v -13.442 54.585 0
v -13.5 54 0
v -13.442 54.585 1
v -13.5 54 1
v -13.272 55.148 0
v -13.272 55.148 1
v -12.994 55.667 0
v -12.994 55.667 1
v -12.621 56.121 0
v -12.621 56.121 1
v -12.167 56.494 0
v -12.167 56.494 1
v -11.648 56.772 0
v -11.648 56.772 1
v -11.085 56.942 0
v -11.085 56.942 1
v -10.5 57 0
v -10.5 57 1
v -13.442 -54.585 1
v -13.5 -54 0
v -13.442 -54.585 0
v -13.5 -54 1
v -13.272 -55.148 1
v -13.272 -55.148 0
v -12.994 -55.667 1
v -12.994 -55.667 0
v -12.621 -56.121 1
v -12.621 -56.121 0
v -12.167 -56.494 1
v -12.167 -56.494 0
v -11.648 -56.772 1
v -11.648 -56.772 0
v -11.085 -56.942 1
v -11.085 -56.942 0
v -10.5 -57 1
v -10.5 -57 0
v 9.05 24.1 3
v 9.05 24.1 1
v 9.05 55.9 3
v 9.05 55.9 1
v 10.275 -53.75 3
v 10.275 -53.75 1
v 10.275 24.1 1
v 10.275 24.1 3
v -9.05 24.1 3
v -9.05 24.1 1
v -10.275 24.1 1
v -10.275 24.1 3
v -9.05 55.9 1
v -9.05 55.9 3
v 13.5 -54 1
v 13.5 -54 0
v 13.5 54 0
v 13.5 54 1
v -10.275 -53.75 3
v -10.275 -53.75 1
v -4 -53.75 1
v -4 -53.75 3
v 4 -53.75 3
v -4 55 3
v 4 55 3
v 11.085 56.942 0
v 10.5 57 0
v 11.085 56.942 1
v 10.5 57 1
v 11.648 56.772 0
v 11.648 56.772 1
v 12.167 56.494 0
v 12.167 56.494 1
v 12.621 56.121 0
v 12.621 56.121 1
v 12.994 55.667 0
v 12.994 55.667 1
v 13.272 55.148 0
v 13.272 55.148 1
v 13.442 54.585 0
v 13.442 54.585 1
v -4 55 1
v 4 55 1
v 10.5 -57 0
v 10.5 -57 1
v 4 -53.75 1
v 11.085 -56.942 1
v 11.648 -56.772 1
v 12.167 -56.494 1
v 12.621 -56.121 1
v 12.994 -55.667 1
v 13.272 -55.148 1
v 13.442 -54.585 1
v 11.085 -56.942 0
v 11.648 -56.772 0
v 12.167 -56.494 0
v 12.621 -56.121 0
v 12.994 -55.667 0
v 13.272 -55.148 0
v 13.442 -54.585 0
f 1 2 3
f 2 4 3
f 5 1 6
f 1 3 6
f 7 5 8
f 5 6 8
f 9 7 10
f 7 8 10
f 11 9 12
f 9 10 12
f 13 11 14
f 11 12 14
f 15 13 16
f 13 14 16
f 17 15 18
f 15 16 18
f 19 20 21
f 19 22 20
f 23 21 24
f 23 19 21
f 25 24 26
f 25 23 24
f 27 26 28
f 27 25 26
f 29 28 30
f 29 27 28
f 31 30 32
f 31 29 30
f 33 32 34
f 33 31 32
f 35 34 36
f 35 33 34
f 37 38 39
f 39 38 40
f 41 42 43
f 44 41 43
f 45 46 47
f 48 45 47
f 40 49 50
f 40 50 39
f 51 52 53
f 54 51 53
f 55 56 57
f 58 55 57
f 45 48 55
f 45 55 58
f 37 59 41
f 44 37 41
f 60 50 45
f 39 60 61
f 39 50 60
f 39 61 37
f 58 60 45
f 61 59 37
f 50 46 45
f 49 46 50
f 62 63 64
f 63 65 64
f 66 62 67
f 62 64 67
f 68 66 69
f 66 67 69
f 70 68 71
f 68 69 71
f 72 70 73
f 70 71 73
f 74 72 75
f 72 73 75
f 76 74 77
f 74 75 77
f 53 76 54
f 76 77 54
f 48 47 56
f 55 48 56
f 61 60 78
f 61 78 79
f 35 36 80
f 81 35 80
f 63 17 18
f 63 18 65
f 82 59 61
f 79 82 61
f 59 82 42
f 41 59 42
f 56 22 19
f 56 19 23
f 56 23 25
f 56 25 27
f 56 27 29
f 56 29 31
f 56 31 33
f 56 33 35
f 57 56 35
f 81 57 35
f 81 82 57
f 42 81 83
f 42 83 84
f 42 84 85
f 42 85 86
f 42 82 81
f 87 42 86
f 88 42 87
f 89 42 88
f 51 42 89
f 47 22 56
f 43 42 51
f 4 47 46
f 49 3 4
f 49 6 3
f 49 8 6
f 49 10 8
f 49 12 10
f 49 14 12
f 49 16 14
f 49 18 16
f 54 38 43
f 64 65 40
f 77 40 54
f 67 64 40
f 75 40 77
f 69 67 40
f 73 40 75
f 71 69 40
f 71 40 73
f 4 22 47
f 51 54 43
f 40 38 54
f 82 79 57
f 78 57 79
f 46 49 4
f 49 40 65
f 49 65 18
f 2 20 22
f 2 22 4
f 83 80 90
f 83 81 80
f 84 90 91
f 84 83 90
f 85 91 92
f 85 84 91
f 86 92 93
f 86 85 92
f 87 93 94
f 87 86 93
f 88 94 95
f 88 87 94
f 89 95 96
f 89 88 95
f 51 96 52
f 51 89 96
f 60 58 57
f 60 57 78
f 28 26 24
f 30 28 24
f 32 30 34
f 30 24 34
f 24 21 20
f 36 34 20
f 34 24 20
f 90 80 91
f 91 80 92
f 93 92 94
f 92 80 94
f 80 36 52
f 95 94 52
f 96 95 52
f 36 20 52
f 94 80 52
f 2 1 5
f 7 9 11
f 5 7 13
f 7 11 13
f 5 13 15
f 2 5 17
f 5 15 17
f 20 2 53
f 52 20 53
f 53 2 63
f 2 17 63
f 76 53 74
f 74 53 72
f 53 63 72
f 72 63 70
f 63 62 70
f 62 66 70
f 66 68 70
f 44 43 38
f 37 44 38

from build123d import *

# Parameters (mm, degrees)
F0_W     = 27
F0_H     = 114
F1_DEPTH = 1
F0_W_2   = 18.1
F0_H_2   = 31.8
F2_DEPTH = 3
F3_R     = 3
F4_W     = 8
F4_H     = 108.75
F5_DEPTH = 2


with BuildPart() as f1:
    # F0 (on Top) → F1 (new body)
    with BuildSketch(Plane.XY):
        Rectangle(F0_W, F0_H)
        Polygon((9.05, 24.1), (10.275, 24.1), (10.275, -53.75), (-10.275, -53.75), (-10.275, 24.1), (-9.05, 24.1), (-9.05, 55.9), (9.05, 55.9), align=None, mode=Mode.SUBTRACT)
    extrude(amount=F1_DEPTH)

    # F0 (on Top) → F2 (join)
    with BuildSketch(Plane.XY):
        Polygon((10.275, -53.75), (10.275, 24.1), (9.05, 24.1), (-9.05, 24.1), (-10.275, 24.1), (-10.275, -53.75), align=None)
        with Locations((0, 40)):
            Rectangle(F0_W_2, F0_H_2)
    extrude(amount=F2_DEPTH)

    # F3
    f3_edges = [f1.edges().sort_by_distance(p)[0] for p in [
        (13.5, -57, 0.5),
        (-13.5, -57, 0.5),
        (13.5, 57, 0.5),
        (-13.5, 57, 0.5),
    ]]
    fillet(f3_edges, radius=F3_R)

    # F4 (on face) → F5 (cut)
    with BuildSketch(Plane.XY.offset(3)):
        with Locations((0, 0.625)):
            Rectangle(F4_W, F4_H)
    extrude(amount=-F5_DEPTH, mode=Mode.SUBTRACT)


solid = f1.part
